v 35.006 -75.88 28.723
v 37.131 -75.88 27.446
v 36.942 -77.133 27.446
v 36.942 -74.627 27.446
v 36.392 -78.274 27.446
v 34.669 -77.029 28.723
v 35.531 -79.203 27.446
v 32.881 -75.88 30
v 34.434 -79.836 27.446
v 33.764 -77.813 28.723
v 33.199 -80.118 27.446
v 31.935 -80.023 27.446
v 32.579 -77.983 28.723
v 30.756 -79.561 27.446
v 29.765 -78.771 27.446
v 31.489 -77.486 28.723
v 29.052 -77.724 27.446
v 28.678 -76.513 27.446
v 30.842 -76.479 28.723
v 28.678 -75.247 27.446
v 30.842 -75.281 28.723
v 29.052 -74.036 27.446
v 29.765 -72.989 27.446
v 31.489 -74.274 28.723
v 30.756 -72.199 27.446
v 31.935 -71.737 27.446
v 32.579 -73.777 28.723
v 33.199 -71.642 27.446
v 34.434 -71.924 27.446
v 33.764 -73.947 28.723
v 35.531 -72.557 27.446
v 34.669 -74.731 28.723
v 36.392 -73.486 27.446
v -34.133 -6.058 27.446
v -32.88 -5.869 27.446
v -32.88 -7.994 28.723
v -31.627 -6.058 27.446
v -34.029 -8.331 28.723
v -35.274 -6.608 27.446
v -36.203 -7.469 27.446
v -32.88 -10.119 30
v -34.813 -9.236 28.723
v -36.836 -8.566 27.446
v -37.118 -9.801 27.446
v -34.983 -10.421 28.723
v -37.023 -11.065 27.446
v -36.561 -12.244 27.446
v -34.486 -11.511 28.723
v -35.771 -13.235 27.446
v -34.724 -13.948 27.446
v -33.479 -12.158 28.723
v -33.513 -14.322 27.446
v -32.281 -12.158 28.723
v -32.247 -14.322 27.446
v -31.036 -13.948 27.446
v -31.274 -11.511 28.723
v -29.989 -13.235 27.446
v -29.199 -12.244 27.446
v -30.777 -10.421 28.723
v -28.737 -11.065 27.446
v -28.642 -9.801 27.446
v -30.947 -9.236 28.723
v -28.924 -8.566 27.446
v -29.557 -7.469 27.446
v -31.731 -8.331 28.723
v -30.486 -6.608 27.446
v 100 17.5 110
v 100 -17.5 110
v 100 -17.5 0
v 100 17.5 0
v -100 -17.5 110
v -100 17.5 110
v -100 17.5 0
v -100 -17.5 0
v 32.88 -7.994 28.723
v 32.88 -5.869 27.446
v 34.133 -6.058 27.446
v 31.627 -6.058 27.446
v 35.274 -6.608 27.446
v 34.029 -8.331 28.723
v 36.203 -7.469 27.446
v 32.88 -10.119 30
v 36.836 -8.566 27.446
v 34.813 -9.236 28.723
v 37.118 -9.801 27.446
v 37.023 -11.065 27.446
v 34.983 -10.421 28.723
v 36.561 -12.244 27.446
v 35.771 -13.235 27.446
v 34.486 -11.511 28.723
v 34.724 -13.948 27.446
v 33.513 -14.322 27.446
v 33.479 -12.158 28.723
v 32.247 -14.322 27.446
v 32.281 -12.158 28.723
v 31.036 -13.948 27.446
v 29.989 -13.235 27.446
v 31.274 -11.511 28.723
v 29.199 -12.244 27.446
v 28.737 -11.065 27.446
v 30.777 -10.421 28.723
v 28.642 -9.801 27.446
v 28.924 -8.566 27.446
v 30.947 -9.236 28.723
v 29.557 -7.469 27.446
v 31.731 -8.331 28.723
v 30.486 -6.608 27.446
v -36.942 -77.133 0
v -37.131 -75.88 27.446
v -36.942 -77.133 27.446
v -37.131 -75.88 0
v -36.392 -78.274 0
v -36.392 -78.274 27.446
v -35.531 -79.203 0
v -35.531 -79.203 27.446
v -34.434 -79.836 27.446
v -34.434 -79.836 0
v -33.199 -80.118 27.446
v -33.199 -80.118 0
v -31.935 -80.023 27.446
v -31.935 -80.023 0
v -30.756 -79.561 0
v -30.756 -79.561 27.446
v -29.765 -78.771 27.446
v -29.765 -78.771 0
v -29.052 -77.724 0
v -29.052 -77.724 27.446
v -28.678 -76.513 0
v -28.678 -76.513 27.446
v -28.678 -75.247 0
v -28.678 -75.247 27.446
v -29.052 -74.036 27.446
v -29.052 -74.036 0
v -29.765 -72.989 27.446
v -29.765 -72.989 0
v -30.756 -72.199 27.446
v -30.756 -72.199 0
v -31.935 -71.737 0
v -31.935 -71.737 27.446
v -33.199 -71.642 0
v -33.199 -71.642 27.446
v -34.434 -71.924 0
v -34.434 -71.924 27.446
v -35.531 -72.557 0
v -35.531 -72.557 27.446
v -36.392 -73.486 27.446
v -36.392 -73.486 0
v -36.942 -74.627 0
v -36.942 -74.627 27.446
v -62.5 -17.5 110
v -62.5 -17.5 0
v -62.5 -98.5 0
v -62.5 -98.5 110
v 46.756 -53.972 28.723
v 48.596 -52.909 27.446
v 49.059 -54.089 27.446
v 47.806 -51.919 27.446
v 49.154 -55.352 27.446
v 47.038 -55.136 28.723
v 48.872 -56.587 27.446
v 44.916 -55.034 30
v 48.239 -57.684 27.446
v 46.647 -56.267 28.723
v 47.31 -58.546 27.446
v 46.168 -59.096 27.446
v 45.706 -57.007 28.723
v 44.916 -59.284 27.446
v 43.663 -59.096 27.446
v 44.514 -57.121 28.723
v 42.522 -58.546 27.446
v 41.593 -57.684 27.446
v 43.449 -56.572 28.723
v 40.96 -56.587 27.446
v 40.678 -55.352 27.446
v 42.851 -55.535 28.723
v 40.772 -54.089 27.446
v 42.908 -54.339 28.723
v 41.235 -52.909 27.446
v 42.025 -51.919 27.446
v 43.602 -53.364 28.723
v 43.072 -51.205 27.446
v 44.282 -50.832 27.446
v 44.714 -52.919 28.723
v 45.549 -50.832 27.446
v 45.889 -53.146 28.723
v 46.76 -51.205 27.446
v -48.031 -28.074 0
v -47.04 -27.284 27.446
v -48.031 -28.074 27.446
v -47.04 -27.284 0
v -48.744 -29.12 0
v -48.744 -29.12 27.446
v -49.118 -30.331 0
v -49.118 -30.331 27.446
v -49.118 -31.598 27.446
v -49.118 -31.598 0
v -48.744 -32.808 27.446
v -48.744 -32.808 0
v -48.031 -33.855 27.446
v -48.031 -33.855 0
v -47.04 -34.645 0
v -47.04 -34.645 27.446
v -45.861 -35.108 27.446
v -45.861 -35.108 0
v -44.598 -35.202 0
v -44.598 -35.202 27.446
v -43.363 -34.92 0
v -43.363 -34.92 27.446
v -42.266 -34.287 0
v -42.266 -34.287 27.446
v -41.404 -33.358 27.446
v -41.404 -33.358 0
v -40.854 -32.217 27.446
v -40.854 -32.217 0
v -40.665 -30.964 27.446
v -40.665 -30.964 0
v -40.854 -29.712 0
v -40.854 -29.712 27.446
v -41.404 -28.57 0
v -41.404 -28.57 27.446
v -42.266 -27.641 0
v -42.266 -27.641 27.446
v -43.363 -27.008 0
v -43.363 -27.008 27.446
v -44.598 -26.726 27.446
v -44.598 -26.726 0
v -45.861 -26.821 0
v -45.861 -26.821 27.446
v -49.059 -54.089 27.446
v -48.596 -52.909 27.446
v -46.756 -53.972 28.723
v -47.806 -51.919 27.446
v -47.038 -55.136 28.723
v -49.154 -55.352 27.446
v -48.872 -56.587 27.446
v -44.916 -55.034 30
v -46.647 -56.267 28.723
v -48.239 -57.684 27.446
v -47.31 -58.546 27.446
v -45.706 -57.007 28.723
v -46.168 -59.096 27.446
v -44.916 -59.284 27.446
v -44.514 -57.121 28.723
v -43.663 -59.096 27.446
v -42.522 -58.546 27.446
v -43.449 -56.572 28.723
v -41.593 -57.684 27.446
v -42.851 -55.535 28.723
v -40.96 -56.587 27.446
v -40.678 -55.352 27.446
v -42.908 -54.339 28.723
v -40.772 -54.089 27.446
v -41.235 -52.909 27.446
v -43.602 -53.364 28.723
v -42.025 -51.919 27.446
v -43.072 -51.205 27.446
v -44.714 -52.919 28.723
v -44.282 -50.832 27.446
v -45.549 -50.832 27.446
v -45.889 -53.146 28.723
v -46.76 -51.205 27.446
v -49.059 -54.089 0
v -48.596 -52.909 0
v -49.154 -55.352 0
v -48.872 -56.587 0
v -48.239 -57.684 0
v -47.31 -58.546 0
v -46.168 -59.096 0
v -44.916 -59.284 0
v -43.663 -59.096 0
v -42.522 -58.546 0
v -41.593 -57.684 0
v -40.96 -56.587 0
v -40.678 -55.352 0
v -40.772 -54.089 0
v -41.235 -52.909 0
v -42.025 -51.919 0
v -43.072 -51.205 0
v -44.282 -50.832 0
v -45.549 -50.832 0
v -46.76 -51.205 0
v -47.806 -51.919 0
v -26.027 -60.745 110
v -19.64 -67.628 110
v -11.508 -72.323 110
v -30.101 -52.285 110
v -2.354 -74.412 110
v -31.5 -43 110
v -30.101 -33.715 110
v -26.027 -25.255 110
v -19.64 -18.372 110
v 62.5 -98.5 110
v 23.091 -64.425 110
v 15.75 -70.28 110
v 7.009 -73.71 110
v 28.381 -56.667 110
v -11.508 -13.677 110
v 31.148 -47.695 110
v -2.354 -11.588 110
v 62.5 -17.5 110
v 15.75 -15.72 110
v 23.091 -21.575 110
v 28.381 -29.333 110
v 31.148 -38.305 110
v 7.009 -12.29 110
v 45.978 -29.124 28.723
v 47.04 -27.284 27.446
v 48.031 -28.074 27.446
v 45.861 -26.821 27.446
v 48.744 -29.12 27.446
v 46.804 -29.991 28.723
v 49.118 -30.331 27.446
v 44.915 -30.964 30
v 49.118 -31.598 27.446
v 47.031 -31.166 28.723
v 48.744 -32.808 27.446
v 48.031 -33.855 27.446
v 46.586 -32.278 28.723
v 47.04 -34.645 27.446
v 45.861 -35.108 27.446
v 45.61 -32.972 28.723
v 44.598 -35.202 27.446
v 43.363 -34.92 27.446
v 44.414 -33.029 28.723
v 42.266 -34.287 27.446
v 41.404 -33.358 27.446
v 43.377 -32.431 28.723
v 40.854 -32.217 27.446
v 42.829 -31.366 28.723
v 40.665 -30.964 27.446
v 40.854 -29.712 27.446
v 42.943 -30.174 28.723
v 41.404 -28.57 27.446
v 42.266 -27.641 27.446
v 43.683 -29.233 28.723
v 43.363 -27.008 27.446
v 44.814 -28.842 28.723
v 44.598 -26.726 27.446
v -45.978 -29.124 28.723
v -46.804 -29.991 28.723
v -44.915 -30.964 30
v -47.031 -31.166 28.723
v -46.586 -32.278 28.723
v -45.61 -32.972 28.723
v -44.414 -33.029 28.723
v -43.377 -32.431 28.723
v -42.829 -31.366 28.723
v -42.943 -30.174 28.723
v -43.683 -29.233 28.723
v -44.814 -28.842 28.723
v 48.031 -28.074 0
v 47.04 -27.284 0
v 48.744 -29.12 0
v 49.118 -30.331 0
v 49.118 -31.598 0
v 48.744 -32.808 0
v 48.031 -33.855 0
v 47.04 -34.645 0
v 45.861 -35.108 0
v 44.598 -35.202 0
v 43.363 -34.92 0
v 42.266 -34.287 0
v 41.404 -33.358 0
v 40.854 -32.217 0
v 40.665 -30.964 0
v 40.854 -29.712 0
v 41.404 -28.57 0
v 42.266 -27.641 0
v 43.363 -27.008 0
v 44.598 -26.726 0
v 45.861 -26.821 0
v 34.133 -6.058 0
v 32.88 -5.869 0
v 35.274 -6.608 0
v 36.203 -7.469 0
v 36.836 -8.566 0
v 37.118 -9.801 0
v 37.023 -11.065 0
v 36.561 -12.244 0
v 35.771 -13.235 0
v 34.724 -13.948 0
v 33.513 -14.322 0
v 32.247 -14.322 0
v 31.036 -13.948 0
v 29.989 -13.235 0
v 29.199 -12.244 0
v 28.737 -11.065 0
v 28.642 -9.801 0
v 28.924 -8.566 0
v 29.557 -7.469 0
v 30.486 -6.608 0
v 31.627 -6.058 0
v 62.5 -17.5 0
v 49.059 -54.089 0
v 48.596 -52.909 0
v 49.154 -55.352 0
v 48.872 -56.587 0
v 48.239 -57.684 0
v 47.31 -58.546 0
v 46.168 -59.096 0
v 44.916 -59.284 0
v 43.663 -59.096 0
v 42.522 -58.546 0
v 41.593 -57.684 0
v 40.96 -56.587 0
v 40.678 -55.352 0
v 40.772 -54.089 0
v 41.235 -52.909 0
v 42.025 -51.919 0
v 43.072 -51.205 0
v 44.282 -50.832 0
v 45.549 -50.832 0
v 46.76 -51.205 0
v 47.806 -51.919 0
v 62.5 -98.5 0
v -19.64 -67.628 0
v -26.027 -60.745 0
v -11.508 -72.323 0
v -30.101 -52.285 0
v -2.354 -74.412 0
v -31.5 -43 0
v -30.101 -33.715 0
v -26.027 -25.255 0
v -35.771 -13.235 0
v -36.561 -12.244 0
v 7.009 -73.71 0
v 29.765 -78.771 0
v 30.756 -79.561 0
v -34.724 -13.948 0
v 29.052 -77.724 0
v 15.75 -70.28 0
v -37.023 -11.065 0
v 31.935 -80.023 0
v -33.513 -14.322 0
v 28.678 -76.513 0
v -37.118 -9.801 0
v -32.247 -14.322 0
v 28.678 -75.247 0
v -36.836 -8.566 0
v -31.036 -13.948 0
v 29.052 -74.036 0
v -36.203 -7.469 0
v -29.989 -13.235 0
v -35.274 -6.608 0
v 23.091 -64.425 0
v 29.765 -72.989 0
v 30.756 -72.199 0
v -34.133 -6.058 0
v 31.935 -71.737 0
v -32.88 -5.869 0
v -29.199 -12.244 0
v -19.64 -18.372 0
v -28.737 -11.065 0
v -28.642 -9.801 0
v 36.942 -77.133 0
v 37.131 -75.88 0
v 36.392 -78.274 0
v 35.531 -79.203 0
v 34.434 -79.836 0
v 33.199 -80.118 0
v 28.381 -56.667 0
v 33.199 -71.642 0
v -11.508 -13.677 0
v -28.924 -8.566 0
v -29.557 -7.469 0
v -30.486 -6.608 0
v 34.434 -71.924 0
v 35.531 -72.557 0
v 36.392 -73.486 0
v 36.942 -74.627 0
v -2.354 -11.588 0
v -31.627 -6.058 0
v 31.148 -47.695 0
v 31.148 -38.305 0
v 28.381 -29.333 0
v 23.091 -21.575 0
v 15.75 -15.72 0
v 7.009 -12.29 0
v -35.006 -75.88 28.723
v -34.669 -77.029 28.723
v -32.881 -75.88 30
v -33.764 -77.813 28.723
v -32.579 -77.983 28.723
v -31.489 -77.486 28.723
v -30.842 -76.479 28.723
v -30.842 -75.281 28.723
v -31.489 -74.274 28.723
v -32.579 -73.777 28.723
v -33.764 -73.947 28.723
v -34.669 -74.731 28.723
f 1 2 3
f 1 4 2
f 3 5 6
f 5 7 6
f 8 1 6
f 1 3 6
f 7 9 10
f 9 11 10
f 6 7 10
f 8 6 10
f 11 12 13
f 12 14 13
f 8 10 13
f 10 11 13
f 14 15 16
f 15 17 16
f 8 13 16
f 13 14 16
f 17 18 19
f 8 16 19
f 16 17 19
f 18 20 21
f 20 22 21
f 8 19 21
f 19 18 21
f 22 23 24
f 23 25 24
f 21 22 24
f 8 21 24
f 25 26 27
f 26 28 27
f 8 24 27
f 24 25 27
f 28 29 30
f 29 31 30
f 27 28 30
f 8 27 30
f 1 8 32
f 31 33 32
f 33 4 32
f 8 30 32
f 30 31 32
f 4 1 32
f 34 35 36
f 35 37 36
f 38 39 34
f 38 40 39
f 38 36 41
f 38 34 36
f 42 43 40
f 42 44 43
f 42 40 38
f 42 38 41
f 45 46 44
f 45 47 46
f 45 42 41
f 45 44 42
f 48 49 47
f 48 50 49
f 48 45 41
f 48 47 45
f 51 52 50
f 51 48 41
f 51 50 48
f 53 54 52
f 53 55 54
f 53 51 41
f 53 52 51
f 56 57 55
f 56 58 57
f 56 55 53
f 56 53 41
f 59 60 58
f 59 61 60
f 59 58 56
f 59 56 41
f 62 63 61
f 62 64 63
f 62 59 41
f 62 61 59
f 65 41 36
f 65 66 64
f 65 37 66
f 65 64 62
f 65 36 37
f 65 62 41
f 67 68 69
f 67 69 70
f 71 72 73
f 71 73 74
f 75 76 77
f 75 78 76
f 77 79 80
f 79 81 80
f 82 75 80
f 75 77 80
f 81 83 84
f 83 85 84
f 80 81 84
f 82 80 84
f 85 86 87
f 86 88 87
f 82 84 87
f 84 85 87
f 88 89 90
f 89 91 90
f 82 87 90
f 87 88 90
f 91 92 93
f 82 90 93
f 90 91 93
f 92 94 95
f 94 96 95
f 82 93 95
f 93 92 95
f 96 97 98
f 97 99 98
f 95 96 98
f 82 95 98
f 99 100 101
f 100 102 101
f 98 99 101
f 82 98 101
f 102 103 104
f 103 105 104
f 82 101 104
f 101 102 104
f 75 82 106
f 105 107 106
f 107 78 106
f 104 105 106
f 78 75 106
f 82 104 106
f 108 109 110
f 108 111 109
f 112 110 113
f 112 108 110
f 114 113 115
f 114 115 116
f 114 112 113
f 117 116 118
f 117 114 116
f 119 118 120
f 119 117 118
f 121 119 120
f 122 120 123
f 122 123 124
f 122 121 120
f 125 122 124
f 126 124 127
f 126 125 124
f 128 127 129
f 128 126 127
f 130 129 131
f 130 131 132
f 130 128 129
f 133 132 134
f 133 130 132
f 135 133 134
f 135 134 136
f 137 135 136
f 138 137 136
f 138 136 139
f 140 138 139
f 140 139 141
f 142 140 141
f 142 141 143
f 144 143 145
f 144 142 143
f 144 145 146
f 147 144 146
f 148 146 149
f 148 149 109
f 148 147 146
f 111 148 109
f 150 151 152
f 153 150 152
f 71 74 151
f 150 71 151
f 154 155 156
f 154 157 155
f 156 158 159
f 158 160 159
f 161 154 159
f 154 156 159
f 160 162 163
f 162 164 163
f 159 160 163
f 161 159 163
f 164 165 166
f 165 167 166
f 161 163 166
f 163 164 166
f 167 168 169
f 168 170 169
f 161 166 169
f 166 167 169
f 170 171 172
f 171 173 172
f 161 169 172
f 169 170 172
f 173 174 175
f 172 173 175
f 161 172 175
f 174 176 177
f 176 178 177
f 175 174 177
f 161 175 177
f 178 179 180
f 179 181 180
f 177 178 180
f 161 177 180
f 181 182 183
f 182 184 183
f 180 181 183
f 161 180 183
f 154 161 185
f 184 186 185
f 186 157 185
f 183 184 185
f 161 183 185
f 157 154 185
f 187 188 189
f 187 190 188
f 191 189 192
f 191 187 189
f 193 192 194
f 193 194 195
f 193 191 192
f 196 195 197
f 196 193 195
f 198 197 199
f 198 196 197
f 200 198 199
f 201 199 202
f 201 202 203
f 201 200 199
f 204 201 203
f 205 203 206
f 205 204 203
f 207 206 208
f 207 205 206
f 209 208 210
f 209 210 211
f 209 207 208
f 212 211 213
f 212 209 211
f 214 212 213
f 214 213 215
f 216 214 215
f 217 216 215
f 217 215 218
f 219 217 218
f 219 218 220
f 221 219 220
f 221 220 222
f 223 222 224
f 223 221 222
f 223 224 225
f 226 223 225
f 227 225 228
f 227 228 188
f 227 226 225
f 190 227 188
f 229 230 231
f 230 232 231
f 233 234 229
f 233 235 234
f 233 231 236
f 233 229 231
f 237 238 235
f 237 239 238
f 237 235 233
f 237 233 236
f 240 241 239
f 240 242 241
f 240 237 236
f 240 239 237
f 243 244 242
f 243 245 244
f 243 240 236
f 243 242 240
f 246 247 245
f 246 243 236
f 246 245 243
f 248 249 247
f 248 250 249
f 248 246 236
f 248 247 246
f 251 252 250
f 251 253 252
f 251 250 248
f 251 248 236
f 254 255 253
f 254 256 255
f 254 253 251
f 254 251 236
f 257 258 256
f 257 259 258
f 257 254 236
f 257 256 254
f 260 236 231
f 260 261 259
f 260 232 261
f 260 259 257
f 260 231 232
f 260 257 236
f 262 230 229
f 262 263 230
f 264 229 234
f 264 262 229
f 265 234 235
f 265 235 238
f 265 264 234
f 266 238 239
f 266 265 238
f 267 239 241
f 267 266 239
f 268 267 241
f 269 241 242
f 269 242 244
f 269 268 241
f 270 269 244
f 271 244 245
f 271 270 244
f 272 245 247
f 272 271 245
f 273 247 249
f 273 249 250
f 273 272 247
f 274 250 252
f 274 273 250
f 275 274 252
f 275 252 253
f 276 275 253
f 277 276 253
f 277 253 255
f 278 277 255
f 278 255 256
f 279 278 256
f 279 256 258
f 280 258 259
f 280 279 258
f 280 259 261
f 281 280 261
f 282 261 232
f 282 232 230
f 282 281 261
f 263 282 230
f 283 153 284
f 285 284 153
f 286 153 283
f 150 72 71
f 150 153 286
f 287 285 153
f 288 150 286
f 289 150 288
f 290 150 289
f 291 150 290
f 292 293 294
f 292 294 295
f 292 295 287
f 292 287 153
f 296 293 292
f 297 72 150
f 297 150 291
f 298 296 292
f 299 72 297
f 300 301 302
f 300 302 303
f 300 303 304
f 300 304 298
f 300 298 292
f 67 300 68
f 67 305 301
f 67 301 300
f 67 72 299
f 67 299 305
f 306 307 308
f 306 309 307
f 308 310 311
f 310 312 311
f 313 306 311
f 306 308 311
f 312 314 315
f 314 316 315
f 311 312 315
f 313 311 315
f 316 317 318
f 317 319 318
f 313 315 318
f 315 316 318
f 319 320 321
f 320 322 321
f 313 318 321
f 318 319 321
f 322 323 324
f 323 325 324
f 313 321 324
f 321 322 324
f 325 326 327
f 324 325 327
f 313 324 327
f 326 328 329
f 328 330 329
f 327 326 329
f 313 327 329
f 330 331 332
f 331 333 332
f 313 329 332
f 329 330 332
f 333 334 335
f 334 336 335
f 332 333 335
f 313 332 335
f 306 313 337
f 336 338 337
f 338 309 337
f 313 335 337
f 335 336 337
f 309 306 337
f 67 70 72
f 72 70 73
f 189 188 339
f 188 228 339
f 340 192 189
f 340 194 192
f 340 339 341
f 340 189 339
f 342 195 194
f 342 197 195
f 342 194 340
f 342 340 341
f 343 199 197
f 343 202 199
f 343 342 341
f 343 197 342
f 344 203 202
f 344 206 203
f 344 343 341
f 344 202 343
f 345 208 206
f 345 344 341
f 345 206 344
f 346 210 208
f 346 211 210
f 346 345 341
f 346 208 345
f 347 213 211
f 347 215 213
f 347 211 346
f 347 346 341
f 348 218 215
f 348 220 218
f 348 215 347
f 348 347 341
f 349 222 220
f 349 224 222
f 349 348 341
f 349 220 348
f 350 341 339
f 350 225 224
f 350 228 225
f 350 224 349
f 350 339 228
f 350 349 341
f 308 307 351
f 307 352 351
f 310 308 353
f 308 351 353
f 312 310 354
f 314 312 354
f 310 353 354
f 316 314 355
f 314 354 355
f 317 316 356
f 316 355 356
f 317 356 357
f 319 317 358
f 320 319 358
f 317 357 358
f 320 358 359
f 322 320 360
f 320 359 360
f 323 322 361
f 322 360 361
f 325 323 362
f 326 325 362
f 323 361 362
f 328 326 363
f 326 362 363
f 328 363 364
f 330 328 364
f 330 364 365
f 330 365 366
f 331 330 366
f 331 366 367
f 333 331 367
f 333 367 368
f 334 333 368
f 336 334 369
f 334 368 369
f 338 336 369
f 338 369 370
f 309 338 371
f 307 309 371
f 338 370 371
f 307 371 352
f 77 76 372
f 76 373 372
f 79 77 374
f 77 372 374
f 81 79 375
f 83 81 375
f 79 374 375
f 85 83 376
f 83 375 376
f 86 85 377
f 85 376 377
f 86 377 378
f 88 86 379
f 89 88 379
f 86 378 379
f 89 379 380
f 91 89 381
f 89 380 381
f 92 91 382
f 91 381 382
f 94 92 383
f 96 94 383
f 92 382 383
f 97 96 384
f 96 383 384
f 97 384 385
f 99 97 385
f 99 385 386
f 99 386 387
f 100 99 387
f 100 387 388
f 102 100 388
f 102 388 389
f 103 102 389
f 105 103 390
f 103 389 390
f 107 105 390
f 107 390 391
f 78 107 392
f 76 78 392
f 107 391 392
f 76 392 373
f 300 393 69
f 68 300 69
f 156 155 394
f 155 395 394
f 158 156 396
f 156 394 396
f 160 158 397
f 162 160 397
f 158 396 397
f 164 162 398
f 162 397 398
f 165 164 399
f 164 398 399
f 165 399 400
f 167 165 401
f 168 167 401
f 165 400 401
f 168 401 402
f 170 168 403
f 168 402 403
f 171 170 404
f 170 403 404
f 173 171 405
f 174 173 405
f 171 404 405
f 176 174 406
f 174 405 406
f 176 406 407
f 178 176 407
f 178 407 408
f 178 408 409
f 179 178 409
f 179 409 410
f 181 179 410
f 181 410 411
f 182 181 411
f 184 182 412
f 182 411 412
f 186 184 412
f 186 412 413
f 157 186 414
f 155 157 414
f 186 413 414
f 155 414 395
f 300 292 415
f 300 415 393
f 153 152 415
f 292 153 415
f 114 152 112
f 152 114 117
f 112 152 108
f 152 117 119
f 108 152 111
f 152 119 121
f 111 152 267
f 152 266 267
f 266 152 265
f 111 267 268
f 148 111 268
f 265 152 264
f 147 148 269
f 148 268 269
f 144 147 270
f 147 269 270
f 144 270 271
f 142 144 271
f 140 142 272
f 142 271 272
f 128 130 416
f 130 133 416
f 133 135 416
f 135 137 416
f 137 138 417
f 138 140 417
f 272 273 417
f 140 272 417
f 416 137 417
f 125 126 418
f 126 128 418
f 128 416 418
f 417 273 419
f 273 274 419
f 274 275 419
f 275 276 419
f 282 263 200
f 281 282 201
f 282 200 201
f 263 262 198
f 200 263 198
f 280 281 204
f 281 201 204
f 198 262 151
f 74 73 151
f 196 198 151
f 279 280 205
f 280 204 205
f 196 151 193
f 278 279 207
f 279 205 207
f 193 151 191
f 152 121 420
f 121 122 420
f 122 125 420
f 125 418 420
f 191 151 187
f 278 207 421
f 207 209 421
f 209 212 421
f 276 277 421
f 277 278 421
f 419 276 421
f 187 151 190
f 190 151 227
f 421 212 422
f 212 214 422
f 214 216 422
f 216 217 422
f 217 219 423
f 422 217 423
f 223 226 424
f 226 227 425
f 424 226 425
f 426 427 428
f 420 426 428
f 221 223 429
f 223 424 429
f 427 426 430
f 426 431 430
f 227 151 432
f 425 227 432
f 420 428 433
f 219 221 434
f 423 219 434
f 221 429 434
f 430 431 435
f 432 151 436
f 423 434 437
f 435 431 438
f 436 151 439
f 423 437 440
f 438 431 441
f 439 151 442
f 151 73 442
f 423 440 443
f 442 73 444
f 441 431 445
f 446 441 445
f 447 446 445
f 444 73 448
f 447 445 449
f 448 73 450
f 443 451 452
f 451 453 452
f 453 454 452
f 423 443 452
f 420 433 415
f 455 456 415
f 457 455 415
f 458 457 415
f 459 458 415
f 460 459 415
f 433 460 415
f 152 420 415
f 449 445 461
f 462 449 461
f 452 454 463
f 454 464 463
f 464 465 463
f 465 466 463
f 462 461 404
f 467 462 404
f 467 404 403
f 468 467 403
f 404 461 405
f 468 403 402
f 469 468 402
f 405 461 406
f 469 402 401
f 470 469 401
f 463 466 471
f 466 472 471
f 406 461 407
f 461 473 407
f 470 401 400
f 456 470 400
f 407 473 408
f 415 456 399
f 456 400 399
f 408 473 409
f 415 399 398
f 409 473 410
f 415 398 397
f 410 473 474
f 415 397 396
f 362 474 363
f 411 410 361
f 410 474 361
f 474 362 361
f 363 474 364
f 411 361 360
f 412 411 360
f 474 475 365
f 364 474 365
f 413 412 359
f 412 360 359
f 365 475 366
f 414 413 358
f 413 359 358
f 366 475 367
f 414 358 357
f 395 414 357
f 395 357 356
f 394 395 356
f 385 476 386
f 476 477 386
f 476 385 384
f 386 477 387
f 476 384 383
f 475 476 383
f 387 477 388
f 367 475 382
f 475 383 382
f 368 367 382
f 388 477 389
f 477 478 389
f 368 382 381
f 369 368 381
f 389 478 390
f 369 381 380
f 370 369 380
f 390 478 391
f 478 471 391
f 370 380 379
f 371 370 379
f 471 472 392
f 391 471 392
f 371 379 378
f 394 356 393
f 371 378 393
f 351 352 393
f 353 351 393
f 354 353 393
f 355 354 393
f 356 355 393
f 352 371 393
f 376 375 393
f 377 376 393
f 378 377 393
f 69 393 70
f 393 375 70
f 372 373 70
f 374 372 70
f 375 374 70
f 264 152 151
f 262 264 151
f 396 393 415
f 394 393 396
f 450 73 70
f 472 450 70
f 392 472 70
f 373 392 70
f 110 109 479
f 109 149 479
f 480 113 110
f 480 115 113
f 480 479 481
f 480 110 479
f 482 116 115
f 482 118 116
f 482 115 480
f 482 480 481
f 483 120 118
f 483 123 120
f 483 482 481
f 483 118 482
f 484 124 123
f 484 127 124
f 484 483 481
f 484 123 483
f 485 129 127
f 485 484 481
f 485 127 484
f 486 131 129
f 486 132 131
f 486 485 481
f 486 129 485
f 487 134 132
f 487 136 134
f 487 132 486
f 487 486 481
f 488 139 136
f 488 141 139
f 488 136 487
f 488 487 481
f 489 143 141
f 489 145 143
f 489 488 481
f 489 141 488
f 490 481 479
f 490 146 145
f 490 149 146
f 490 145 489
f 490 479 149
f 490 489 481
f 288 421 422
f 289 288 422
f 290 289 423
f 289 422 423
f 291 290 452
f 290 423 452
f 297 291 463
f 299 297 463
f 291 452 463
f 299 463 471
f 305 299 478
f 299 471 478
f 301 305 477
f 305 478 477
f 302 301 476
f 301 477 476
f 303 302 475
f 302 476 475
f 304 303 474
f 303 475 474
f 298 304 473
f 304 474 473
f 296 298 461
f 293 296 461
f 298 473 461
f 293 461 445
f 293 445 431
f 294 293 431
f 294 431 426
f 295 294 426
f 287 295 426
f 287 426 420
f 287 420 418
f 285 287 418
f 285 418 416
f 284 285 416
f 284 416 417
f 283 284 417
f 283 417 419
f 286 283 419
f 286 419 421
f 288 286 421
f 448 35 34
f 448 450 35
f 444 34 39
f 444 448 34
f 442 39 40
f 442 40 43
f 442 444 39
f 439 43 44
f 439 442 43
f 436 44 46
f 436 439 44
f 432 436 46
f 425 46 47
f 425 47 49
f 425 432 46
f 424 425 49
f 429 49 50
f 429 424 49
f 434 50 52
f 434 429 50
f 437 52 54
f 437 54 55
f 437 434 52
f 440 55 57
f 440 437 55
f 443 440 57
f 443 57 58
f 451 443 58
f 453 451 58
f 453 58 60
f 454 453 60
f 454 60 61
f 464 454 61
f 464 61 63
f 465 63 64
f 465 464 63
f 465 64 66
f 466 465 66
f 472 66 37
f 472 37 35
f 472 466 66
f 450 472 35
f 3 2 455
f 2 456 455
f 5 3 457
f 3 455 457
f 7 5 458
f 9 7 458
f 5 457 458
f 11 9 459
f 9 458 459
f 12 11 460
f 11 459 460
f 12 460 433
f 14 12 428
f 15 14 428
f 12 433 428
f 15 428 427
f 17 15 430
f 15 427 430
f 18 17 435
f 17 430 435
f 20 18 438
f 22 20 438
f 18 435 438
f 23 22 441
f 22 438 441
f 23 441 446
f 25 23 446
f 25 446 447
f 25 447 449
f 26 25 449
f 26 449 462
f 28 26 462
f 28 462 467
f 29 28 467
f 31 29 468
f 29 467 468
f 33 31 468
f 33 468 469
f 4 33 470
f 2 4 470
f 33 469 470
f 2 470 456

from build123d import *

# Parameters (mm, degrees)
EXTRUDE_1_DEPTH          = 110
CUT_EXTRUDE_1_REACH      = 180.332
SKETCH_2_R               = 31.5
PATTERN_CIRCULAR_1_COUNT = 4
PATTERN_CIRCULAR_1_ANGLE = 90


with BuildPart() as part:
    # 草图1 → 凸台-拉伸1 (new body)
    with BuildSketch(Plane.XY):
        Polygon((-100, -17.5), (-62.5, -17.5), (-62.5, -98.5), (62.5, -98.5), (62.5, -17.5), (100, -17.5), (100, 17.5), (-100, 17.5), align=None)
    extrude(amount=EXTRUDE_1_DEPTH)

    # 草图2 → 切除-拉伸1 (cut, up to next)
    with BuildSketch(Plane(origin=(0, 0, 0), x_dir=(-1, 0, 0), z_dir=(0, 0, -1)), mode=Mode.PRIVATE) as cut_extrude_1_sk1:
        with Locations((0, -43)):
            Circle(SKETCH_2_R)
    cut_extrude_1_tool1 = extrude(cut_extrude_1_sk1.sketch, amount=-CUT_EXTRUDE_1_REACH, mode=Mode.PRIVATE) & part.part
    add(cut_extrude_1_tool1.solids().sort_by_distance((0, -43, 0))[0], mode=Mode.SUBTRACT)

    # 草图5 → M10 螺纹孔1 (revolve, cut)
    with BuildSketch(Plane(origin=(-32.88, -10.119069356, 0), x_dir=(0, 1, 0), z_dir=(1, 0, 0))):
        Polygon((0, 0), (0, 30), (4.25, 27.446342369), (4.25, 0), align=None)
    hole_wizard_m10_1 = revolve(axis=Axis((-32.88, -10.119069356, -6.35), (0, 0, 1)), mode=Mode.SUBTRACT)

    # 阵列(圆周)1: M10 螺纹孔1 ×4 about axis
    pattern_circular_1_axis = Axis((0, -43, 0), (0, 0, 1))
    for i in range(1, PATTERN_CIRCULAR_1_COUNT):
        add(hole_wizard_m10_1.rotate(pattern_circular_1_axis, i * PATTERN_CIRCULAR_1_ANGLE / (PATTERN_CIRCULAR_1_COUNT - 1)), mode=Mode.SUBTRACT)

    # 镜向1: M10 螺纹孔1 across plane
    add(hole_wizard_m10_1.mirror(Plane(origin=(0, 0, 0), x_dir=(0, 0, 1), z_dir=(1, 0, 0))), mode=Mode.SUBTRACT)

    # 镜向1 copy 1 sketch → 镜向1 copy 1 (revolve, cut)
    with BuildSketch(Plane(origin=(44.915380598, -30.964278762, 0), x_dir=(0.5000000000000011, 0.866025403784438, 0), z_dir=(-0.866025403784438, 0.5000000000000011, 0))):
        Polygon((0, 0), (0, -30), (4.25, -27.446342369), (4.25, 0), align=None)
    revolve(axis=Axis((44.915380598, -30.964278762, -6.35), (0, 0, -1)), mode=Mode.SUBTRACT)

    # 镜向1 copy 2 sketch → 镜向1 copy 2 (revolve, cut)
    with BuildSketch(Plane(origin=(44.915721238, -55.034449955, 0), x_dir=(0.8660254037844399, 0.4999999999999978, 0), z_dir=(-0.4999999999999978, 0.8660254037844399, 0))):
        Polygon((0, 0), (0, -30), (4.25, -27.446342369), (4.25, 0), align=None)
    revolve(axis=Axis((44.915721238, -55.034449955, -6.35), (0, 0, -1)), mode=Mode.SUBTRACT)

    # 镜向1 copy 3 sketch → 镜向1 copy 3 (revolve, cut)
    with BuildSketch(Plane(origin=(32.880930644, -75.88, 0), x_dir=(1, 0, 0), z_dir=(0, 1, 0))):
        Polygon((0, 0), (0, -30), (4.25, -27.446342369), (4.25, 0), align=None)
    revolve(axis=Axis((32.880930644, -75.88, -6.35), (0, 0, -1)), mode=Mode.SUBTRACT)


solid = part.part
